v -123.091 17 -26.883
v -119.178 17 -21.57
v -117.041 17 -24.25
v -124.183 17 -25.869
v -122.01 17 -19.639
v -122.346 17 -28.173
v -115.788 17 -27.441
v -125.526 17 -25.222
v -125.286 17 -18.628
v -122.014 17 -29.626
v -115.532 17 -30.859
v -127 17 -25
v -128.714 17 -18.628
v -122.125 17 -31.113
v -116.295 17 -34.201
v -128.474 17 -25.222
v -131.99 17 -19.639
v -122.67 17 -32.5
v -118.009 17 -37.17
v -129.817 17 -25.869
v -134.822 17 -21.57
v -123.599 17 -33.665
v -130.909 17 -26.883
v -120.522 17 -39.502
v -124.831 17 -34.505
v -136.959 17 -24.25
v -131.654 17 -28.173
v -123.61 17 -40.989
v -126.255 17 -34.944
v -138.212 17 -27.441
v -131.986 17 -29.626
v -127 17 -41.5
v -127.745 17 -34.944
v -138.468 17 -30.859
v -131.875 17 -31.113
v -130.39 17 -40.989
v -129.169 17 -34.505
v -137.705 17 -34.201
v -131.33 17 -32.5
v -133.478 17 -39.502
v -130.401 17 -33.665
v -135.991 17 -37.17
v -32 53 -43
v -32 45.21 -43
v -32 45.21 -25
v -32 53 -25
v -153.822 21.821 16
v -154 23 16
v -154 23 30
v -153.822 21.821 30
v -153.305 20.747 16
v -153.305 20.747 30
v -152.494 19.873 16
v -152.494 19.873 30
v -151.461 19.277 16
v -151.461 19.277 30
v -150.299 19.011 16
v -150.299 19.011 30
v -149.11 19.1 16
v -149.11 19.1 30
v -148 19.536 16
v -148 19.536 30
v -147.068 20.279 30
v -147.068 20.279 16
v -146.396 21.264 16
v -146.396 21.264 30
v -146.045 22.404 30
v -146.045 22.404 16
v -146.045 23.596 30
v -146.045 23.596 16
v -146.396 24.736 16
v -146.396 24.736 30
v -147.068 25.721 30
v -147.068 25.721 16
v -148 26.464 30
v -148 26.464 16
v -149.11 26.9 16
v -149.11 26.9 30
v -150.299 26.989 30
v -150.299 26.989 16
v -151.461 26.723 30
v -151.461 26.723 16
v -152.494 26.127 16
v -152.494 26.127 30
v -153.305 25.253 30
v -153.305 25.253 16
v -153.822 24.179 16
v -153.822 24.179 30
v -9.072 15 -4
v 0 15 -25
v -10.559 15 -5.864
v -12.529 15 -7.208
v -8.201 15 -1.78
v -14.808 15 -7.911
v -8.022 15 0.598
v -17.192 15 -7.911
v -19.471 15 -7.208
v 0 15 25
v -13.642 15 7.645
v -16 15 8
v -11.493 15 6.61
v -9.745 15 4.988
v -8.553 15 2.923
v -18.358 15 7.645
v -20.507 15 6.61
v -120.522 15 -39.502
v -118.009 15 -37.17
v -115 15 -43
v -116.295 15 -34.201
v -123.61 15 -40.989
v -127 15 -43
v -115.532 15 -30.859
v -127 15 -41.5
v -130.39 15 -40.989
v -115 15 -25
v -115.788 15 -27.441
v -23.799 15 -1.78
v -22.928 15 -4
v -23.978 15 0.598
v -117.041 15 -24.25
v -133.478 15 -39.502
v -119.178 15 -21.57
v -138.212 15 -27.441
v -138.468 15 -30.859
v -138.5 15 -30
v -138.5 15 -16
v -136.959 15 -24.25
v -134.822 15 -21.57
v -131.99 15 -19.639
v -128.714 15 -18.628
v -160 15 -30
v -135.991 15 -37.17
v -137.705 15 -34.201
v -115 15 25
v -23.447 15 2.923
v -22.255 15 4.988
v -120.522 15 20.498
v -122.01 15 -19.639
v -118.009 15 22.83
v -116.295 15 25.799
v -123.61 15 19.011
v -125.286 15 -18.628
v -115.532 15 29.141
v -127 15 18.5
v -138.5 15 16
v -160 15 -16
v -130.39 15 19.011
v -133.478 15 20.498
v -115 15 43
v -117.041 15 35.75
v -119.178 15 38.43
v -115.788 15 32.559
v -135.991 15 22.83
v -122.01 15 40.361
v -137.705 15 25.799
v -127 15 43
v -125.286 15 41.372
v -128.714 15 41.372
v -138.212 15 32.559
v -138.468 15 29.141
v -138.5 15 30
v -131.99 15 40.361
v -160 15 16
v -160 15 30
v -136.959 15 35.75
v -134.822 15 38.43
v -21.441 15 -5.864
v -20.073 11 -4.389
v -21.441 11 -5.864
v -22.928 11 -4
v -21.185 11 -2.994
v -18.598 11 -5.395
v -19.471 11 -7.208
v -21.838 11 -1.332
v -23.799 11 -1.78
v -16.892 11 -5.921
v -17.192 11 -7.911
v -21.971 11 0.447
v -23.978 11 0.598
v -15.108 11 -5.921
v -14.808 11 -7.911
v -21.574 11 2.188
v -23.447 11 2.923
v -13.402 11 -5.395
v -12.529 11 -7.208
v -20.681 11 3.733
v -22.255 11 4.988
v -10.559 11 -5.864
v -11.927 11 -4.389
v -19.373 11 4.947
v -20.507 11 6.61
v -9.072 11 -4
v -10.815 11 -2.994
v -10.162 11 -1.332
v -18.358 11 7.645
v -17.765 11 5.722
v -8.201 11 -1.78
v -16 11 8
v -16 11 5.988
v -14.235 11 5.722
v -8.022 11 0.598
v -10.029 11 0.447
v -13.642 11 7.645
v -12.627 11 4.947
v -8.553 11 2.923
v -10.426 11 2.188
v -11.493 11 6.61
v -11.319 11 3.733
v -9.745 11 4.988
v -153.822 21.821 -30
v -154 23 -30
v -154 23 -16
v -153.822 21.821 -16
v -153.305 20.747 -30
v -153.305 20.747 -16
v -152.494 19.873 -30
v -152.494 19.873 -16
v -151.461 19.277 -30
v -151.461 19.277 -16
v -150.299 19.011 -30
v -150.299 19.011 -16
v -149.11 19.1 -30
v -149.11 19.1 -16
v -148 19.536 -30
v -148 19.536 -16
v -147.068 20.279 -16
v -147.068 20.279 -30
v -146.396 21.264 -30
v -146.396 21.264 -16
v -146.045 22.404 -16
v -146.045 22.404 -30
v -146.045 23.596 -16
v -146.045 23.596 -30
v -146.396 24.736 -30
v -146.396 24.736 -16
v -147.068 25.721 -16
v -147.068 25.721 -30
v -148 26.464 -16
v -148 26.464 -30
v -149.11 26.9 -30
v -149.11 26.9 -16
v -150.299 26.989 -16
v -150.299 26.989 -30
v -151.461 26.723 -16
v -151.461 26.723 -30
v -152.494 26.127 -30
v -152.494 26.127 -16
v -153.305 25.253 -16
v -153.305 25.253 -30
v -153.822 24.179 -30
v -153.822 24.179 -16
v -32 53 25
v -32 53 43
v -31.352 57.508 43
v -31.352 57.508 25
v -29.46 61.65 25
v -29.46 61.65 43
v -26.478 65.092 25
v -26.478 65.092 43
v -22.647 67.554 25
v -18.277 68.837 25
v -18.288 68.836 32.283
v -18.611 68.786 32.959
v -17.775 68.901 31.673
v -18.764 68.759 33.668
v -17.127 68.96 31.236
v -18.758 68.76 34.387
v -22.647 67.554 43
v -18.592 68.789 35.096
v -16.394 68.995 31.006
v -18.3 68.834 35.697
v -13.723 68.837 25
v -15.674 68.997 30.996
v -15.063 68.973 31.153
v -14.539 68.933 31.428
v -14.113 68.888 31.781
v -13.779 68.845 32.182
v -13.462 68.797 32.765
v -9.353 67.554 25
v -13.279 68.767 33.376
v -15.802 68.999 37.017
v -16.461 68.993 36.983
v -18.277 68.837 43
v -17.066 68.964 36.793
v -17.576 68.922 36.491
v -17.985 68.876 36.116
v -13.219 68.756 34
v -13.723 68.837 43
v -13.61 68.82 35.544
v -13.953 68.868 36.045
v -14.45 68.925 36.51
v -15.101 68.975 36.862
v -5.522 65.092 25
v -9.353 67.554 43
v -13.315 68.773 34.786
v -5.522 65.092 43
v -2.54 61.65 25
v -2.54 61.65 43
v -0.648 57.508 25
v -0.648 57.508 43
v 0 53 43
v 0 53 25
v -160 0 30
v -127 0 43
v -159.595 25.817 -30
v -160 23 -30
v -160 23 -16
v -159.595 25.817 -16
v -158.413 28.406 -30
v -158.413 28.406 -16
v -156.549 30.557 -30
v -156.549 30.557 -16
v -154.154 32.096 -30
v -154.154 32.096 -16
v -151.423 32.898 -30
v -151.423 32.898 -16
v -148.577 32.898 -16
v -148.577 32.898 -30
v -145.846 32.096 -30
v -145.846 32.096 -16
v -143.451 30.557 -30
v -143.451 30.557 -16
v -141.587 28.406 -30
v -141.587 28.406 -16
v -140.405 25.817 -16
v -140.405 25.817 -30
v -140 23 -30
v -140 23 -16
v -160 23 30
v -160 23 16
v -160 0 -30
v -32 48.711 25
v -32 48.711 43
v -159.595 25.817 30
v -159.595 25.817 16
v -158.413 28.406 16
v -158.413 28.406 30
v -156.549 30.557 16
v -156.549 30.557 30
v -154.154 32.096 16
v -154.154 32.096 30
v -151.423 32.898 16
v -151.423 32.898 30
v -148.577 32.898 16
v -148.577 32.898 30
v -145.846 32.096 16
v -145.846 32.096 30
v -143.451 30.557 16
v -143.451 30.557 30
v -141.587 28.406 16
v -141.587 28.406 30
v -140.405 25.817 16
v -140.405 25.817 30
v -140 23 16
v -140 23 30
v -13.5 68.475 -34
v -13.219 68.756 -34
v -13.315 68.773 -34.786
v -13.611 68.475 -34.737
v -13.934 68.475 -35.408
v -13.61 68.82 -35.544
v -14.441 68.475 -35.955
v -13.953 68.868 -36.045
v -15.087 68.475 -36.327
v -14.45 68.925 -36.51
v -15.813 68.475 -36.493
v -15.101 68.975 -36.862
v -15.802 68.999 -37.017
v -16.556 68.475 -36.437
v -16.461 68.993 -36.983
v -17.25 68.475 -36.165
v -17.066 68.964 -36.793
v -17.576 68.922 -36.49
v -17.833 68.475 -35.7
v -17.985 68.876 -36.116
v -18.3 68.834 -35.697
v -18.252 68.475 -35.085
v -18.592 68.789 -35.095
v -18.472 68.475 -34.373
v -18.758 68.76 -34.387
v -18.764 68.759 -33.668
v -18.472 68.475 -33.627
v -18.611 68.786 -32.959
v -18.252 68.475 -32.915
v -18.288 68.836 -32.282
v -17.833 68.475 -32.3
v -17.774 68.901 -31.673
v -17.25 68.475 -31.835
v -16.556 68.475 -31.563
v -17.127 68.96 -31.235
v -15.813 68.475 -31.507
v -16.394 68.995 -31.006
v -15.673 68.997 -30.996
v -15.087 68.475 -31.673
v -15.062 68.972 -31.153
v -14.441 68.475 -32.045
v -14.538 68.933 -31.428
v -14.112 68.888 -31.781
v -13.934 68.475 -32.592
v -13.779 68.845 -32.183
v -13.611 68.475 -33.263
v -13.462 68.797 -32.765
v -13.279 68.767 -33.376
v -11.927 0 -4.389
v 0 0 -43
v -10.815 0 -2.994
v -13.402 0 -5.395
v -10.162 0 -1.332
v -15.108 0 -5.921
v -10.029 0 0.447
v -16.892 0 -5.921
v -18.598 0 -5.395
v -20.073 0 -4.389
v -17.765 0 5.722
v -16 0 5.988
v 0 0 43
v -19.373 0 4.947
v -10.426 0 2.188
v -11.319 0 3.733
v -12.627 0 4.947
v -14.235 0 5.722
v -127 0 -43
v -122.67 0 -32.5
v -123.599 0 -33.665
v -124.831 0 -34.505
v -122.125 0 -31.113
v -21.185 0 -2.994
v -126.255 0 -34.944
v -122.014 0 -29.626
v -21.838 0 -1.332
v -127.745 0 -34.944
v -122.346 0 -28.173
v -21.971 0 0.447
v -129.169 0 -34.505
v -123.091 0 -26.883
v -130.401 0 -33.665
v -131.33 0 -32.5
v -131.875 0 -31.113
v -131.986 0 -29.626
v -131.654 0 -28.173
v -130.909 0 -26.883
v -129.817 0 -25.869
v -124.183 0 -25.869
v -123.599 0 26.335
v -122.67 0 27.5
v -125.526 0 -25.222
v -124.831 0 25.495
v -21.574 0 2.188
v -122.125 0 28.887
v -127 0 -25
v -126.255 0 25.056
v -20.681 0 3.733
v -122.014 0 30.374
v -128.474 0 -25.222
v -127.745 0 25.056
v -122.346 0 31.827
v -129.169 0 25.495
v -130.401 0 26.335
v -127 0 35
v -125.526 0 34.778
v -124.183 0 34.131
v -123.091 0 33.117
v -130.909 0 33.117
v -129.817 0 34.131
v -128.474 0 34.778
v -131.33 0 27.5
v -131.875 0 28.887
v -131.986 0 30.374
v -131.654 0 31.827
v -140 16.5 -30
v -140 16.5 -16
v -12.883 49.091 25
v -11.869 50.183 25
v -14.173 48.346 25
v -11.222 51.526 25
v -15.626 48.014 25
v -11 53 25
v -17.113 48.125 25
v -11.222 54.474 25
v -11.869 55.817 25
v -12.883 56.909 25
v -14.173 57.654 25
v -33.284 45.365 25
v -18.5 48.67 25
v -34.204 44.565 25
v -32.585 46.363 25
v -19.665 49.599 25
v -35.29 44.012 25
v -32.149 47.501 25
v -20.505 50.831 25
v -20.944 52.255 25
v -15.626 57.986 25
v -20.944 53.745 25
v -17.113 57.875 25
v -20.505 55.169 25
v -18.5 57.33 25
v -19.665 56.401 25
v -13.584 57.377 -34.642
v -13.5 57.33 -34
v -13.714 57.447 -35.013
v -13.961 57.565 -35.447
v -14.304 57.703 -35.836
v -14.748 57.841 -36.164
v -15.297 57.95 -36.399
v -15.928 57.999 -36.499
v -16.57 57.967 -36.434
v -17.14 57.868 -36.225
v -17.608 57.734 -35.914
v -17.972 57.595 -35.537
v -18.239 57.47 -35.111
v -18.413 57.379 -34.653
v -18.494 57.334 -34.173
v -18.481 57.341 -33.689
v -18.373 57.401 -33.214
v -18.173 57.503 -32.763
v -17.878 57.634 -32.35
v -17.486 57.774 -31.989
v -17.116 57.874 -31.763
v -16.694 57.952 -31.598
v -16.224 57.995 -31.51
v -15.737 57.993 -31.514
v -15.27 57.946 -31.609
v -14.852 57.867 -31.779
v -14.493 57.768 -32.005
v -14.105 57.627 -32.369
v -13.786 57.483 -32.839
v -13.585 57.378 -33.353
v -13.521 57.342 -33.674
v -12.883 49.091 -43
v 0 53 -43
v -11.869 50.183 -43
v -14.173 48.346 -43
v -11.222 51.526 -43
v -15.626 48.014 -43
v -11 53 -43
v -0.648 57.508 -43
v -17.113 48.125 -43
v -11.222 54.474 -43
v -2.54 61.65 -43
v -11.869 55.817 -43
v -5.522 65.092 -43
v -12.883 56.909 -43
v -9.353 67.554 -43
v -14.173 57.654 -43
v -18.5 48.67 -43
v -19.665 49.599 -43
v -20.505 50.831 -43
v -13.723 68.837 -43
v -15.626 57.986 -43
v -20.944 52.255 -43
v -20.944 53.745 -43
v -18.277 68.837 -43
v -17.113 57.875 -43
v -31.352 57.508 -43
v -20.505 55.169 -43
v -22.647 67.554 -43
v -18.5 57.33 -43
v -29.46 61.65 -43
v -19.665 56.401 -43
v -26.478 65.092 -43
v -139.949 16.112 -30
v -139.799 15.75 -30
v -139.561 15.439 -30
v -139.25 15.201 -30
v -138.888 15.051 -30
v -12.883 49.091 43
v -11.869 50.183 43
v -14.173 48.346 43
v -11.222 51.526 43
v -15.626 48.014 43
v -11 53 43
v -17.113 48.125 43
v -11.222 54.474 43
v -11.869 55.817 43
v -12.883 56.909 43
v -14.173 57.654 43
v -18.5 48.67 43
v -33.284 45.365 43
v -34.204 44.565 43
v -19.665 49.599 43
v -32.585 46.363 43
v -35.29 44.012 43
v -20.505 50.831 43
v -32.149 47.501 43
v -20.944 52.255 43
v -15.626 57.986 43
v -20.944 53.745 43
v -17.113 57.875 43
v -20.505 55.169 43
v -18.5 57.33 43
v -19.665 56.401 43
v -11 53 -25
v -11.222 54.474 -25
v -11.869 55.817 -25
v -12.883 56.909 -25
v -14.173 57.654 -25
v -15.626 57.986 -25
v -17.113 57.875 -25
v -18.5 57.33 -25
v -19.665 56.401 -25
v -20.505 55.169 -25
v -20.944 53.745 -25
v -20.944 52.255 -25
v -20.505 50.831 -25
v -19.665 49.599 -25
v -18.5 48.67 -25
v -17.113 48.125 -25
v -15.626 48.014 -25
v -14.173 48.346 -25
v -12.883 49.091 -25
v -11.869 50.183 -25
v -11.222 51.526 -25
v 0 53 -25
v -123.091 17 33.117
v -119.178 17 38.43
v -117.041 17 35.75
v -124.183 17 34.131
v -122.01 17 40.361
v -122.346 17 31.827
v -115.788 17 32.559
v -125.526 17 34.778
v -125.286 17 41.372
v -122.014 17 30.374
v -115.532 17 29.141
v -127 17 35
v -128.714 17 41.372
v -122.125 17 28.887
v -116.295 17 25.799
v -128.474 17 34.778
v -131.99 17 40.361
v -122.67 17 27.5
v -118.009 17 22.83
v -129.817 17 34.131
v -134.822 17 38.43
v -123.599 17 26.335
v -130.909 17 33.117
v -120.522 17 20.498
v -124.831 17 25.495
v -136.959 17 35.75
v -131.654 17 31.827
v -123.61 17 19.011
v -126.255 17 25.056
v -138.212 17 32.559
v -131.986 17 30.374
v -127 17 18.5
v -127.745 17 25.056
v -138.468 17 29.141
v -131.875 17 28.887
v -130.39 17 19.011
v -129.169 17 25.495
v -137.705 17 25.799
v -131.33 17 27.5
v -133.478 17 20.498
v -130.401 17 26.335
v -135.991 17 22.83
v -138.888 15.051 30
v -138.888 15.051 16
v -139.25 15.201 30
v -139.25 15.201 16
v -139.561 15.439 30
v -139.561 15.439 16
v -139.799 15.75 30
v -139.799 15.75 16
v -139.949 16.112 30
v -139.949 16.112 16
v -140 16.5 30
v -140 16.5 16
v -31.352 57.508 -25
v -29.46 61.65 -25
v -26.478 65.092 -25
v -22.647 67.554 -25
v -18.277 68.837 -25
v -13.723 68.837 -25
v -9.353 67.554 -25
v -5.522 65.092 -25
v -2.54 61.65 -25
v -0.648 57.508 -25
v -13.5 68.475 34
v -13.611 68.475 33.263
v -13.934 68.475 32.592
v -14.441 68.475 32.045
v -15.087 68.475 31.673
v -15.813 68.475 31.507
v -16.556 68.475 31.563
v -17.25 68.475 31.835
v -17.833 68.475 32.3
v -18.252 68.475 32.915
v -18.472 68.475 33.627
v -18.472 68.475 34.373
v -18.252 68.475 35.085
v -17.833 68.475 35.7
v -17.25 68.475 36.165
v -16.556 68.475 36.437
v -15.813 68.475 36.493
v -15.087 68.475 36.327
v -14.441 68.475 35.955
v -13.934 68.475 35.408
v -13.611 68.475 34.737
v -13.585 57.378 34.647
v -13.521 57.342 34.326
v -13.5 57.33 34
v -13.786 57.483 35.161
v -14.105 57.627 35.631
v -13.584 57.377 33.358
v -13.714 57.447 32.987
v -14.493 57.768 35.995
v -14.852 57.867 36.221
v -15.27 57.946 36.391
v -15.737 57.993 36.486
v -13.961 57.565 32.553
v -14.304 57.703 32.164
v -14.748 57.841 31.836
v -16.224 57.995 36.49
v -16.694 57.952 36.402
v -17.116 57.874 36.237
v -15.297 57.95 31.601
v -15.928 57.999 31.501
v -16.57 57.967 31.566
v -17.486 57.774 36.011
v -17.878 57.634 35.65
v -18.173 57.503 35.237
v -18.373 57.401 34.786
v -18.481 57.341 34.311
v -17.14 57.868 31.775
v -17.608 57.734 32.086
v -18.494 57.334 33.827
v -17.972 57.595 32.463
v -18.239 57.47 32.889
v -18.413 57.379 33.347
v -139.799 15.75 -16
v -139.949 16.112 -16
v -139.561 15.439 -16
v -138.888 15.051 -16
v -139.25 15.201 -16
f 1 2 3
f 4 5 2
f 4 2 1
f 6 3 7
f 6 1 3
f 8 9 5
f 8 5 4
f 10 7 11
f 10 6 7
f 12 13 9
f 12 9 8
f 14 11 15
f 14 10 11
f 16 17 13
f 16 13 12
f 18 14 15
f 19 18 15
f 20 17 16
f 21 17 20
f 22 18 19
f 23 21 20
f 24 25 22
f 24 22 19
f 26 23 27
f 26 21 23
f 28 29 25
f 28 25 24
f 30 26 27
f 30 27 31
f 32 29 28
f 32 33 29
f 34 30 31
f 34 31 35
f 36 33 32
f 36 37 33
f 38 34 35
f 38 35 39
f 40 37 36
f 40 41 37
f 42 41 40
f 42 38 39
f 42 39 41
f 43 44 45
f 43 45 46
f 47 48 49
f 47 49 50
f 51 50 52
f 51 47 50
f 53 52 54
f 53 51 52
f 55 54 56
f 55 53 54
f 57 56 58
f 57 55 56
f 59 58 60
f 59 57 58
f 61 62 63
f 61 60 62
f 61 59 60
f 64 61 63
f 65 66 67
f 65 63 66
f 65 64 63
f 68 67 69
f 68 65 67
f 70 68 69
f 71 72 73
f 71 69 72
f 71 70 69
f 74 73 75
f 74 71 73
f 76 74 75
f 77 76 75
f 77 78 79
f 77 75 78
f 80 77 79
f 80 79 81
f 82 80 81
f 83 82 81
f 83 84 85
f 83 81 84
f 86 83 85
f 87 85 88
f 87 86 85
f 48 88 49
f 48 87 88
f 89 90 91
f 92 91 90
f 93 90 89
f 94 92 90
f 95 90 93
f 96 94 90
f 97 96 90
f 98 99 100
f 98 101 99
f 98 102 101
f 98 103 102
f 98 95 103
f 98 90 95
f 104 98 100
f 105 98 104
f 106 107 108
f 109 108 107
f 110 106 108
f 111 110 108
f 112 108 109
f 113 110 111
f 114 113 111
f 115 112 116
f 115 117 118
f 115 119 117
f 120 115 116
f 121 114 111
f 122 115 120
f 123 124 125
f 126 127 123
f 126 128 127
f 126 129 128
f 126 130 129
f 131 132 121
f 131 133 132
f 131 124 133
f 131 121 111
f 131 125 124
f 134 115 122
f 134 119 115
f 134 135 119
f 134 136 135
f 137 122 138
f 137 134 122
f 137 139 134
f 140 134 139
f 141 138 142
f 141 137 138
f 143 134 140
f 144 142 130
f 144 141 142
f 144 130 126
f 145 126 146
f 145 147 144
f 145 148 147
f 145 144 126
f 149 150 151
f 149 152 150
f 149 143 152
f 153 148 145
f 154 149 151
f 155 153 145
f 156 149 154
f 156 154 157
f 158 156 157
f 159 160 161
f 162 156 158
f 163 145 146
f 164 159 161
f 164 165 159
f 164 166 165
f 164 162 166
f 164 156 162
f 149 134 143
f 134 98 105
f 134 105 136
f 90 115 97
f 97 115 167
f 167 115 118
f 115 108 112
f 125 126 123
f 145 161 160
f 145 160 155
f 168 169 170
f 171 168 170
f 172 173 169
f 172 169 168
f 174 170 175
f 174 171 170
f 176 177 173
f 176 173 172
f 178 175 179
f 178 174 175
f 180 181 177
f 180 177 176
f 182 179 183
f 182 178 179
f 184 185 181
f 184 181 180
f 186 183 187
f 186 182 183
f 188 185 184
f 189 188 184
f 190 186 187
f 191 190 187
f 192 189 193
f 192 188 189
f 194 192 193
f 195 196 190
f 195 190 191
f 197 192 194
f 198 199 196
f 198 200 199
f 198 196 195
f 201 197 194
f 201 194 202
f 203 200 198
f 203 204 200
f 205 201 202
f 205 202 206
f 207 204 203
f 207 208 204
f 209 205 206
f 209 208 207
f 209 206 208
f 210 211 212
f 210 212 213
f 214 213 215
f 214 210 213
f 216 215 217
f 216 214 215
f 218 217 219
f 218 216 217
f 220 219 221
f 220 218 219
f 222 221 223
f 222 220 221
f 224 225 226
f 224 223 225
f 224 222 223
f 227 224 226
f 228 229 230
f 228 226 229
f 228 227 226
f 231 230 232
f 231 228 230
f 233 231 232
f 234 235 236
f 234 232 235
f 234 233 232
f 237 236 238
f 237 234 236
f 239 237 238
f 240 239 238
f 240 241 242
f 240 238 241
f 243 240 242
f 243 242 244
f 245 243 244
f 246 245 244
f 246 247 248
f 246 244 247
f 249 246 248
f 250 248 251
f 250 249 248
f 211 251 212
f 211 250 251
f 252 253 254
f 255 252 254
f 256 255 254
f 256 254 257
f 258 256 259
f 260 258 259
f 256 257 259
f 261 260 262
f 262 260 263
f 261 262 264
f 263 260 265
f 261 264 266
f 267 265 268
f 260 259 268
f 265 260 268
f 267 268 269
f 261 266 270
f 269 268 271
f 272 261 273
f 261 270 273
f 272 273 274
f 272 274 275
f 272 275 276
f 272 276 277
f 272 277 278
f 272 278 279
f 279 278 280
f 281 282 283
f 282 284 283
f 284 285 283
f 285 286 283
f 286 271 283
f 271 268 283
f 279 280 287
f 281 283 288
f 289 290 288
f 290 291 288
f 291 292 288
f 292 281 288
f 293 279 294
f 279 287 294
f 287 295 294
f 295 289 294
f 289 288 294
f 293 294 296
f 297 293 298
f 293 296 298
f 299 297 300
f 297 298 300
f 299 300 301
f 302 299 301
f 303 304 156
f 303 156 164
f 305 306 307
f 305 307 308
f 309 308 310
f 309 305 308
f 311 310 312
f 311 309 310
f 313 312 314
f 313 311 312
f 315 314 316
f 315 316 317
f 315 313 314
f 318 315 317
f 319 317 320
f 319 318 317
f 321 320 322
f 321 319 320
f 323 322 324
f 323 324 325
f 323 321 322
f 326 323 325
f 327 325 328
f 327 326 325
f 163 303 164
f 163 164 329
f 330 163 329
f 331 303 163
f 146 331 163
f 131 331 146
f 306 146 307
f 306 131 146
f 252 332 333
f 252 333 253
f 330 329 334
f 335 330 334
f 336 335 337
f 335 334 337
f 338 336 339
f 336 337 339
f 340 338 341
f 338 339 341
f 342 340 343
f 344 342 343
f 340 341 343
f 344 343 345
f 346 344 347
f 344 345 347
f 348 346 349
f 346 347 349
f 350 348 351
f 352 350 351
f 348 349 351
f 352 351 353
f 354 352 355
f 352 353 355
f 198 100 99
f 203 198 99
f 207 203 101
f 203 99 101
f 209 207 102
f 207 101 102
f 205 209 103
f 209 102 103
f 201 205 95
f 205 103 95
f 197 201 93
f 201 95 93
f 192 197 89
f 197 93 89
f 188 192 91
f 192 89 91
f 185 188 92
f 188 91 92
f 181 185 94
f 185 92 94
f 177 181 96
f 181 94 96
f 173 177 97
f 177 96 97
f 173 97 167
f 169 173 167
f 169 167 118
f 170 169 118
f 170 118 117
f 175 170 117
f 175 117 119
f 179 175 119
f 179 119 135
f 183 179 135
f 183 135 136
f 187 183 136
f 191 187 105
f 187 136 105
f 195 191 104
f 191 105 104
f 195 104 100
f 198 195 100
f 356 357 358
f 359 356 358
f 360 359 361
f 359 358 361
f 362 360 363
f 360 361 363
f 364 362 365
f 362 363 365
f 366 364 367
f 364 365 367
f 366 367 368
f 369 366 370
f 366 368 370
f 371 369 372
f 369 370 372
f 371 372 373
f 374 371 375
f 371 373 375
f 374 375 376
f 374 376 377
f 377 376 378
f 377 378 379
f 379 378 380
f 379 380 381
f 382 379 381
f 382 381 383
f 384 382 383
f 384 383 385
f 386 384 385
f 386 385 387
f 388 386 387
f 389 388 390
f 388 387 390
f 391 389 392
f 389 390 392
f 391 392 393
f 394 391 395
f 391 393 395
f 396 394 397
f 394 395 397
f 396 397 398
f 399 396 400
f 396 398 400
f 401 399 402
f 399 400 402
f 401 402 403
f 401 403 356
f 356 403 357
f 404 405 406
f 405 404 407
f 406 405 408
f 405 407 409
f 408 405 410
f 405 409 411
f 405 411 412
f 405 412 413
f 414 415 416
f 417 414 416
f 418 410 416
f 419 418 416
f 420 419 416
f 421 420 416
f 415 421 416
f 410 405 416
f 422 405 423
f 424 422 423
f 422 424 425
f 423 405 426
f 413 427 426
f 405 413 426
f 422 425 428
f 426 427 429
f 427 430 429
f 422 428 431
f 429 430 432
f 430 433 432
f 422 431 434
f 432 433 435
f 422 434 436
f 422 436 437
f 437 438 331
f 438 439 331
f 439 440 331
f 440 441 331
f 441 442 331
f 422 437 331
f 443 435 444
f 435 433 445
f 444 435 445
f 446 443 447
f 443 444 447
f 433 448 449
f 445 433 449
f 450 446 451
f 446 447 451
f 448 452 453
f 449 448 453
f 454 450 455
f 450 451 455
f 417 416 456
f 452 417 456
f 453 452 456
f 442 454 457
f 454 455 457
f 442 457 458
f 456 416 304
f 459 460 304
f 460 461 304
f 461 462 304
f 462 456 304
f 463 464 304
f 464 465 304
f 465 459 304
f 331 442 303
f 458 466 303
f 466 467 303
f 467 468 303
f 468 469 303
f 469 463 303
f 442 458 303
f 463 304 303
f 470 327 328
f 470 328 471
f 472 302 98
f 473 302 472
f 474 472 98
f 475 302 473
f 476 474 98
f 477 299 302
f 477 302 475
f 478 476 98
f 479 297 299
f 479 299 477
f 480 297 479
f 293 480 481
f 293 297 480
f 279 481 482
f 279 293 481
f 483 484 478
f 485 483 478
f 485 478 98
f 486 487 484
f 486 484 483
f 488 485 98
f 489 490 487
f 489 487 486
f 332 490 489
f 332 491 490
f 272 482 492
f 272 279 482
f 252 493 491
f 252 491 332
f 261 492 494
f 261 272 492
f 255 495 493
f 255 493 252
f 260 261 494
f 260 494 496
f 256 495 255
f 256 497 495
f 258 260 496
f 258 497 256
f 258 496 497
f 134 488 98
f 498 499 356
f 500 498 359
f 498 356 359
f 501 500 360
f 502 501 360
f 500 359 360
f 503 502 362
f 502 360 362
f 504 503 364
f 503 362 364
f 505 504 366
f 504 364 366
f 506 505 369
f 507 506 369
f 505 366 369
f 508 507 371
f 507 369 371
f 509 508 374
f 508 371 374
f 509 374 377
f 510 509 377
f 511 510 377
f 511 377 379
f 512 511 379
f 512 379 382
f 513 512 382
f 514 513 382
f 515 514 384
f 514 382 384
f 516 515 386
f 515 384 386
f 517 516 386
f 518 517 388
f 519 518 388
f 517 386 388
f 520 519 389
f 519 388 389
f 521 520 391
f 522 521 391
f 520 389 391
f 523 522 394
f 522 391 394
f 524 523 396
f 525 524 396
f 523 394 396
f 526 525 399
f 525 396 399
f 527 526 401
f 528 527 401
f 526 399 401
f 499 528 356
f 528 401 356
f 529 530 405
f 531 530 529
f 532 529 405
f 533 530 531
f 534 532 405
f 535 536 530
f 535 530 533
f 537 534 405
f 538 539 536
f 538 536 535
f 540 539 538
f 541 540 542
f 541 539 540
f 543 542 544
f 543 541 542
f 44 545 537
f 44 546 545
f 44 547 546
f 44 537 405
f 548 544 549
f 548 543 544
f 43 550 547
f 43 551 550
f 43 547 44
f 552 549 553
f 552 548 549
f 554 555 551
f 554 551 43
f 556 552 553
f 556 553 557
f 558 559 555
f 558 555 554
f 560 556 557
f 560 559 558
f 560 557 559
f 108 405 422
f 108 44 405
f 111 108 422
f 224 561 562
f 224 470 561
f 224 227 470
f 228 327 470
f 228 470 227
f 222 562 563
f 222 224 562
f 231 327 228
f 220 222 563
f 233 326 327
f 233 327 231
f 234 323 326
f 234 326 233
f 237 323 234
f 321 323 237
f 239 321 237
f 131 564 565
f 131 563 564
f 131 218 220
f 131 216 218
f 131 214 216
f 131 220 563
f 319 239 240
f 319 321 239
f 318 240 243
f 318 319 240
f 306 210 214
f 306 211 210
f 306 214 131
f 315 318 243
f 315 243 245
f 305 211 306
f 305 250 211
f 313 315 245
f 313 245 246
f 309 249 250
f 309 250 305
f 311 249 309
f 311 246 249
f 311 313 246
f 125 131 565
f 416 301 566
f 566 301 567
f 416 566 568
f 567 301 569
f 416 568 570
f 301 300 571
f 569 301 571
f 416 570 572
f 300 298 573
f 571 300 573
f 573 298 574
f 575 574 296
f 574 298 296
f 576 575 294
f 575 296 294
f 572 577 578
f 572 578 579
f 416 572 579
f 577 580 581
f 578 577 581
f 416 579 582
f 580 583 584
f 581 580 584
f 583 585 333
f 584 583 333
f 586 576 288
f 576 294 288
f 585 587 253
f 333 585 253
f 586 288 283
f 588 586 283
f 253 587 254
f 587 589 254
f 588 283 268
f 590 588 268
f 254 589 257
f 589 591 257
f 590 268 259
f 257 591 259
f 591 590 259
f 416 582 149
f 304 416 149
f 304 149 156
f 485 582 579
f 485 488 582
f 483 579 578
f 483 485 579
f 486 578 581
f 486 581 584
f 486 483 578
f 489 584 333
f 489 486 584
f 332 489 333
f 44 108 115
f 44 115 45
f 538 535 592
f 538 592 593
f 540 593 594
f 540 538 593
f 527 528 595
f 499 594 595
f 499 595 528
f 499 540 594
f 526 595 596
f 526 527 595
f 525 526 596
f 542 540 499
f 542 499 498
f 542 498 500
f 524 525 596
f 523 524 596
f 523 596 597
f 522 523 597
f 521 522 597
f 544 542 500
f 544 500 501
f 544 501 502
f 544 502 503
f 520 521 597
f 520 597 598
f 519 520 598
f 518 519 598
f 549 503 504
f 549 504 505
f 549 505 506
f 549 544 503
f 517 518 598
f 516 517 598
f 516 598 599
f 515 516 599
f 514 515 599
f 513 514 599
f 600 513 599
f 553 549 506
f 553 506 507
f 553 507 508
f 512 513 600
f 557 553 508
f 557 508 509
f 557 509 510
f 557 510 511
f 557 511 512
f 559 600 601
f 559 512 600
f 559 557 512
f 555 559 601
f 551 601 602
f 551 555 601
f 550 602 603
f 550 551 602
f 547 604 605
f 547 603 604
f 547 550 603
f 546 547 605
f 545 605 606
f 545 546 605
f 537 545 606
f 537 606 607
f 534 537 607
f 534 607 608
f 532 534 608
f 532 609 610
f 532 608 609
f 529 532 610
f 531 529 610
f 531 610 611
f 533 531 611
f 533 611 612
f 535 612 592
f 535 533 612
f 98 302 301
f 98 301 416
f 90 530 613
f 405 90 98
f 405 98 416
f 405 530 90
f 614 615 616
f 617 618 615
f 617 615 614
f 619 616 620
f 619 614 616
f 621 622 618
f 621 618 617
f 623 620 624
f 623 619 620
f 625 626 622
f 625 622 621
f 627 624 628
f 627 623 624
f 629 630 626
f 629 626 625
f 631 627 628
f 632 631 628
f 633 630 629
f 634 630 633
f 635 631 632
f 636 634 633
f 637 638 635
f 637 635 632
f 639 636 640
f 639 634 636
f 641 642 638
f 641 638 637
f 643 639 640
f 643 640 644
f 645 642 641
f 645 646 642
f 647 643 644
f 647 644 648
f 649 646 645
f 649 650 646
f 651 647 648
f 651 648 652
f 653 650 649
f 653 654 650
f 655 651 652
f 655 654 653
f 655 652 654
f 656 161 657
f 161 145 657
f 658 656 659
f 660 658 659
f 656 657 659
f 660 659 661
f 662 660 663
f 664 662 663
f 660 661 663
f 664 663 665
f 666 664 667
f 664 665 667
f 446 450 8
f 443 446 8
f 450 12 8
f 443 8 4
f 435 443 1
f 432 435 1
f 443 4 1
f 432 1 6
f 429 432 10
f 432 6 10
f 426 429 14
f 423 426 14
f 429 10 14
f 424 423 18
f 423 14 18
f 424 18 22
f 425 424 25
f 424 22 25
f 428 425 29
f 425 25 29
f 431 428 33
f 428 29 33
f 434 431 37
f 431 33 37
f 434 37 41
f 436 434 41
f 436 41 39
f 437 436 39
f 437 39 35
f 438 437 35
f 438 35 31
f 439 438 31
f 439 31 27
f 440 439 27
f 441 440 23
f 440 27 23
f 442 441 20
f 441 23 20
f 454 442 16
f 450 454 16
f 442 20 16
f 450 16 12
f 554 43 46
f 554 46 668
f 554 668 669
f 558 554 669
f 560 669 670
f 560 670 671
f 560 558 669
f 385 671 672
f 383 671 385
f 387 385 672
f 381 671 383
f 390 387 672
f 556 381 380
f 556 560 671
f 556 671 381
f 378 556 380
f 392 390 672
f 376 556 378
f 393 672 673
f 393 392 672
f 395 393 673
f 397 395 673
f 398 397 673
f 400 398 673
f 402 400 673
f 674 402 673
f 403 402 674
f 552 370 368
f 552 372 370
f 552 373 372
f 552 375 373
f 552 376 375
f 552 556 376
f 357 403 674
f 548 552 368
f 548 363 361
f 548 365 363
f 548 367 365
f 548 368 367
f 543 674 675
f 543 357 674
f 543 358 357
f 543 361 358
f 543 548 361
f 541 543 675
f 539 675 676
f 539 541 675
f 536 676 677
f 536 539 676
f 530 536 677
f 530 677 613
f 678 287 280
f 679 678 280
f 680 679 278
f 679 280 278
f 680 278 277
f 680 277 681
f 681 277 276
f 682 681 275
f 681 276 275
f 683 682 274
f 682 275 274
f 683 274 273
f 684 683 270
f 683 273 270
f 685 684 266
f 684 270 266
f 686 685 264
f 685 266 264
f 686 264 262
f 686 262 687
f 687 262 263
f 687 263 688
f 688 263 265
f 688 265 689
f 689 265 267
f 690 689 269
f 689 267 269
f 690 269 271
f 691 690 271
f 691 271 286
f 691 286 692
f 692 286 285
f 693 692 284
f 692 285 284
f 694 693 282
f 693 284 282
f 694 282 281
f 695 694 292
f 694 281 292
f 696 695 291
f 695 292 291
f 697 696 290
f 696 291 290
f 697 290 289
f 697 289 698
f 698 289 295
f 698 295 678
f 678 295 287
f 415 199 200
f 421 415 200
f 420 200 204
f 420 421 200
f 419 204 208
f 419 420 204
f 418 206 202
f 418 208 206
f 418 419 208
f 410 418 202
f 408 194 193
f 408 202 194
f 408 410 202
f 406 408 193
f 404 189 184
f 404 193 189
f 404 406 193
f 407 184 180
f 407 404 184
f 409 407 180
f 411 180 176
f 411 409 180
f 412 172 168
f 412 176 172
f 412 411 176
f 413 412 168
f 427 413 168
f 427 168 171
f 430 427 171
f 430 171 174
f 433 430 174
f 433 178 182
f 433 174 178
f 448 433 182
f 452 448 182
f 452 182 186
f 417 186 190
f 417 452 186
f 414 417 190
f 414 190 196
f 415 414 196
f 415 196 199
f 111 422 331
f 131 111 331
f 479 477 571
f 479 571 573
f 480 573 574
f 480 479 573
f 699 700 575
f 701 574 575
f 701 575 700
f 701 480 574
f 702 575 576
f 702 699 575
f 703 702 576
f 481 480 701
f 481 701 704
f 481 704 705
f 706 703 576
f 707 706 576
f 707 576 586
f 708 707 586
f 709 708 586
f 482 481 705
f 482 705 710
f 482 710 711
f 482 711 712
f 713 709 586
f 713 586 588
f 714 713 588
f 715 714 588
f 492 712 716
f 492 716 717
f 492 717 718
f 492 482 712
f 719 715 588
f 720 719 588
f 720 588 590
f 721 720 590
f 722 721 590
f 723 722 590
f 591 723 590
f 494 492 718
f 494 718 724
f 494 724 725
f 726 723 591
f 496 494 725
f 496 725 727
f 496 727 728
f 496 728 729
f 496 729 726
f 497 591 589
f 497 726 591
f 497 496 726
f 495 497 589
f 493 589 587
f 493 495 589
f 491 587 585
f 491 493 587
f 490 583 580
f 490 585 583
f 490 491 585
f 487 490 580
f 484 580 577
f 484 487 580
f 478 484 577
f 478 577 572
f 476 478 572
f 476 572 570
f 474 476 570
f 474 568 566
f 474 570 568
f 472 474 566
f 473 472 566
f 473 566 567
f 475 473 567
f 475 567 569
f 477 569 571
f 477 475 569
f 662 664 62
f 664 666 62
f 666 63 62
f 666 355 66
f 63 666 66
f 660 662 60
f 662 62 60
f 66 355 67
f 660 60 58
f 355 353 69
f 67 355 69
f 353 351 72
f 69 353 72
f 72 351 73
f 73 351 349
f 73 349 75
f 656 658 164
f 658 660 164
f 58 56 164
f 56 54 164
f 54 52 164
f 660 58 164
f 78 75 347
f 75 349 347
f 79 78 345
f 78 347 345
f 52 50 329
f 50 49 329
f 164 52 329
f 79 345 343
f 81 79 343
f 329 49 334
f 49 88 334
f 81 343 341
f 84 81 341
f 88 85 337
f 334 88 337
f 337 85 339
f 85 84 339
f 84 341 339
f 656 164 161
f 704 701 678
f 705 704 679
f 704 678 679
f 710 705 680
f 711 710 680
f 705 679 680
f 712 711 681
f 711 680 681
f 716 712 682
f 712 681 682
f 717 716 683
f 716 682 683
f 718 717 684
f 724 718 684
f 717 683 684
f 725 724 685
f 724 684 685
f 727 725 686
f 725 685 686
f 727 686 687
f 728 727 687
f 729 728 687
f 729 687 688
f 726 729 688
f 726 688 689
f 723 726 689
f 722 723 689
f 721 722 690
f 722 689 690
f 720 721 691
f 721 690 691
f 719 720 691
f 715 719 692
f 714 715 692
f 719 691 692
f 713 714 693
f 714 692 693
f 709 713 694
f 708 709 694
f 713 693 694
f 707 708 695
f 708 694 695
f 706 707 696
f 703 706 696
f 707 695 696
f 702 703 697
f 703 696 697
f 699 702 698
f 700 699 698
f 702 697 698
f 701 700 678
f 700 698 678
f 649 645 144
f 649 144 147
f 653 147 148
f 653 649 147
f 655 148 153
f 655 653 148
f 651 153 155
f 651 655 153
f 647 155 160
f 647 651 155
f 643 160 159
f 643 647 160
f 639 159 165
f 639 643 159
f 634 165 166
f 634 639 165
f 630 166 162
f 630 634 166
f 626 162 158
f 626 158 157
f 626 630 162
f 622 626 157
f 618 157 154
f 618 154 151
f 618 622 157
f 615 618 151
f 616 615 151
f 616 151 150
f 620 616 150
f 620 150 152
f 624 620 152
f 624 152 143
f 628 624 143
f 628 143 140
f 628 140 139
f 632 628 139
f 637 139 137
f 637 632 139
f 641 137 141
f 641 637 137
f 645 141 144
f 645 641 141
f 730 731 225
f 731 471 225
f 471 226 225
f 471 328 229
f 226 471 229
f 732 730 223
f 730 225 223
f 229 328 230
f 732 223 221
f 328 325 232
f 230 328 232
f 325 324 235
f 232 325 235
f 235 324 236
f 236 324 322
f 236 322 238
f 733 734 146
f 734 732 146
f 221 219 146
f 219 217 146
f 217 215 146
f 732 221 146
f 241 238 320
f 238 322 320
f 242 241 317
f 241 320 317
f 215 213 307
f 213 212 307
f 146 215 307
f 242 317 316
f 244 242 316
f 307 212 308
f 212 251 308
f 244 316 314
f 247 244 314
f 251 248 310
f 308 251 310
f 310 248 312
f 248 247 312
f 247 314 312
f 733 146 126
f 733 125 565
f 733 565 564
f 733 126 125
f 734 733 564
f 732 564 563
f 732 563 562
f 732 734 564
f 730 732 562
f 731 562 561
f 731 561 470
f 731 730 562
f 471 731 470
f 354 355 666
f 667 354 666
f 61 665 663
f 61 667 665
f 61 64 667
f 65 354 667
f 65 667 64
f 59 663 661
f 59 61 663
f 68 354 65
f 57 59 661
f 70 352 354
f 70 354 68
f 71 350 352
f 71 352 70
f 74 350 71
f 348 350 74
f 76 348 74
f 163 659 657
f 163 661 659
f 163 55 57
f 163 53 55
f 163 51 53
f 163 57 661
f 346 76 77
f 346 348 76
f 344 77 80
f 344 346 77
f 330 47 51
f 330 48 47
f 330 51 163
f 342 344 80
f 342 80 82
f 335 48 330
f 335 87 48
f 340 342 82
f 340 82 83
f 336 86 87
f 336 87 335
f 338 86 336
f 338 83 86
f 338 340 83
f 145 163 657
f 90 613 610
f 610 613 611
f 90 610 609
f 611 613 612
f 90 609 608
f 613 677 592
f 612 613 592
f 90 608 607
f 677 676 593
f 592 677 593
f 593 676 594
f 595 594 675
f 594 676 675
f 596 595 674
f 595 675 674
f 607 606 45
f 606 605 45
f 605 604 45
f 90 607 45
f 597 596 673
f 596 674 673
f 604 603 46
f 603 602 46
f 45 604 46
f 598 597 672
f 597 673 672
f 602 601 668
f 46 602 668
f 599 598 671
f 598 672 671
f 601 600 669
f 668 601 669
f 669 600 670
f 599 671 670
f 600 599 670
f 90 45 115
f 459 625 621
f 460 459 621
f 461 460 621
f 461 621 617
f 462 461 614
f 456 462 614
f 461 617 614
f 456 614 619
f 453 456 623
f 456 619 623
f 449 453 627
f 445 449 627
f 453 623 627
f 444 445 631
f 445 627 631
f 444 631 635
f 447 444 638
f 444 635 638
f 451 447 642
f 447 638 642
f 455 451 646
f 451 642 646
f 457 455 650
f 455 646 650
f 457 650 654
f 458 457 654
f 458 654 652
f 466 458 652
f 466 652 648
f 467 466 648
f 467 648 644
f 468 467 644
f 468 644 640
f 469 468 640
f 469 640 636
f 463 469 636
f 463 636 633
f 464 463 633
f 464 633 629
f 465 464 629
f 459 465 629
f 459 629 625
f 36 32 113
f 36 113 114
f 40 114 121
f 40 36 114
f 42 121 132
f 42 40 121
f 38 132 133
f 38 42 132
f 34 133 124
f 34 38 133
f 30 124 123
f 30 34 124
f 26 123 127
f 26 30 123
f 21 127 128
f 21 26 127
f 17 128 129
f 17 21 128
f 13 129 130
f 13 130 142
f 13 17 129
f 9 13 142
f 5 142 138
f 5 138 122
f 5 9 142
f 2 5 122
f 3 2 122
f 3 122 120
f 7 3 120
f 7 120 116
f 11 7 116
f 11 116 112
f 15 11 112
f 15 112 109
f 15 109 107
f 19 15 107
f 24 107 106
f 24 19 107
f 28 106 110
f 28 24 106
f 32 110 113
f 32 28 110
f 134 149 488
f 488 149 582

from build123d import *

# Parameters (mm, degrees)
BOSS_EXTRU_1_DEPTH           = 15
BOSS_EXTRU_2_DEPTH           = 18
BOSS_EXTRU_3_DEPTH           = 14
CONG_1_R                     = 5
ENL_V_MAT_EXTRU_1_DEPTH      = 189.917971617
ENL_V_MAT_EXTRU_1_DEPTH_BACK = 189.917971617
ESQUISSE4_R                  = 4
ENL_V_MAT_EXTRU_2_DEPTH      = 195.311605418
ENL_V_MAT_EXTRU_2_DEPTH_BACK = 195.311605418
ESQUISSE5_R                  = 5
ENL_V_MAT_EXTRU_3_DEPTH      = 175.255559452
ENL_V_MAT_EXTRU_3_DEPTH_BACK = 175.255559452
ESQUISSE6_R                  = 5.987648709
ESQUISSE7_R                  = 8
ENL_V_MAT_EXTRU_4_DEPTH      = 4
ENL_V_MAT_EXTRU_5_REACH      = 176.256
ESQUISSE12_R                 = 5
BOSS_EXTRU_4_START           = 2
ESQUISSE13_R                 = 11.5
ESQUISSE13_R_2               = 5
BOSS_EXTRU_4_DEPTH           = 2
CONG_2_R                     = 1.5


# Read off the part's stored shape, not the designer's step: Trou taraudé M61
with BuildPart() as part:
    # Esquisse1 → Boss.-Extru.1 (new body)
    with BuildSketch(Plane(origin=(0, 0, 0), x_dir=(1, 0, 0), z_dir=(0, 1, 0))):
        Polygon((0, -43), (-127, -43), (-160, -30), (-160, 0), (0, 0), align=None)
    boss_extru_1 = extrude(amount=BOSS_EXTRU_1_DEPTH)

    # Esquisse2 → Boss.-Extru.2 (add)
    with BuildSketch(Plane.XY.offset(43)):
        with BuildLine():
            Line((-32, 45.209529444), (-32, 53))
            ThreePointArc((-32, 53), (-16, 69), (0, 53))
            Line((0, 53), (0, 15))
            Line((0, 15), (-115, 15))
            Line((-115, 15), (-32, 45.209529444))
        make_face()
    boss_extru_2 = extrude(amount=-BOSS_EXTRU_2_DEPTH)

    # Esquisse3 → Boss.-Extru.3 (add)
    with BuildSketch(Plane.XY.offset(30)):
        with BuildLine():
            Line((-140, 23), (-140, 15))
            Line((-140, 15), (-160, 15))
            Line((-160, 15), (-160, 23))
            ThreePointArc((-160, 23), (-150, 33), (-140, 23))
        make_face()
    boss_extru_3 = extrude(amount=-BOSS_EXTRU_3_DEPTH)

    # Congé1
    cong_1_edges = [part.edges().sort_by_distance(p)[0] for p in [
        (-32, 45.209529444, 34),
    ]]
    fillet(cong_1_edges, radius=CONG_1_R)

    # Symétrie1: Boss.-Extru.1, Boss.-Extru.2, Boss.-Extru.3 across plane
    add(boss_extru_1.mirror(Plane.XY))
    add(boss_extru_2.mirror(Plane.XY))
    add(boss_extru_3.mirror(Plane.XY))

    # Esquisse4 → Enlèv. mat.-Extru.1 (cut, two sides: drawn at the far end of the back side and taken through both)
    with BuildSketch(Plane.XY.offset(30).offset(-ENL_V_MAT_EXTRU_1_DEPTH_BACK)):
        with Locations(Location((-150, 23, 0), (0, 0, 180))):
            Circle(ESQUISSE4_R)
    extrude(amount=ENL_V_MAT_EXTRU_1_DEPTH + ENL_V_MAT_EXTRU_1_DEPTH_BACK, mode=Mode.SUBTRACT)

    # Esquisse5 → Enlèv. mat.-Extru.2 (cut, two sides: drawn at the far end of the back side and taken through both)
    with BuildSketch(Plane.XY.offset(43).offset(-ENL_V_MAT_EXTRU_2_DEPTH_BACK)):
        with Locations((-16, 53)):
            Circle(ESQUISSE5_R)
    extrude(amount=ENL_V_MAT_EXTRU_2_DEPTH + ENL_V_MAT_EXTRU_2_DEPTH_BACK, mode=Mode.SUBTRACT)

    # Esquisse6 → Enlèv. mat.-Extru.3 (cut, two sides: drawn at the far end of the back side and taken through both)
    with BuildSketch(Plane(origin=(0, 15, 0), x_dir=(1, 0, 0), z_dir=(0, 1, 0)).offset(-ENL_V_MAT_EXTRU_3_DEPTH_BACK)):
        with Locations(Location((-16, 0, 0), (0, 0, 270))):
            Circle(ESQUISSE6_R)
    extrude(amount=ENL_V_MAT_EXTRU_3_DEPTH + ENL_V_MAT_EXTRU_3_DEPTH_BACK, mode=Mode.SUBTRACT)

    # Esquisse7 → Enlèv. mat.-Extru.4 (cut)
    with BuildSketch(Plane(origin=(0, 15, 0), x_dir=(1, 0, 0), z_dir=(0, 1, 0))):
        with Locations(Location((-16, 0, 0), (0, 0, 270))):
            Circle(ESQUISSE7_R)
    extrude(amount=-ENL_V_MAT_EXTRU_4_DEPTH, mode=Mode.SUBTRACT)

    # Trou taraudé M61 outline → Trou taraudé M61 (revolve, cut)
    with BuildSketch(Plane(origin=(-16, 0, 34), x_dir=(1, 0, 0), z_dir=(0, 0, 1))):
        Polygon((0, 57.329808988), (2.5, 57.329808988), (2.5, 68.475), (3.02508907, 69.00008907), (0, 69.00008907), align=None)
    revolve(axis=Axis((-16, 0, 34), (0, 1, 0)), mode=Mode.SUBTRACT)

    # Trou taraud_ M61 2 outline → Trou taraud_ M61 2 (revolve, cut)
    with BuildSketch(Plane(origin=(-16, 0, -34), x_dir=(1, 0, 0), z_dir=(0, 0, 1))):
        Polygon((3.025080927, 69.000080927), (0, 69.000080927), (0, 57.329808988), (2.5, 57.329808988), (2.5, 68.475), align=None)
    revolve(axis=Axis((-16, 0, -34), (0, 1, 0)), mode=Mode.SUBTRACT)

    # Esquisse12 → Enlèv. mat.-Extru.5 (cut, up to next)
    with BuildSketch(Plane(origin=(0, 15, 0), x_dir=(1, 0, 0), z_dir=(0, 1, 0)), mode=Mode.PRIVATE) as enl_v_mat_extru_5_sk1:
        with Locations(Location((-127, -30, 0), (0, 0, 270))):
            Circle(ESQUISSE12_R)
    enl_v_mat_extru_5_tool1 = extrude(enl_v_mat_extru_5_sk1.sketch, amount=-ENL_V_MAT_EXTRU_5_REACH, mode=Mode.PRIVATE) & part.part
    # Esquisse12 → Enlèv. mat.-Extru.5 (cut, up to next)
    with BuildSketch(Plane(origin=(0, 15, 0), x_dir=(1, 0, 0), z_dir=(0, 1, 0)), mode=Mode.PRIVATE) as enl_v_mat_extru_5_sk2:
        with Locations(Location((-127, 30, 0), (0, 0, 270))):
            Circle(ESQUISSE12_R)
    enl_v_mat_extru_5_tool2 = extrude(enl_v_mat_extru_5_sk2.sketch, amount=-ENL_V_MAT_EXTRU_5_REACH, mode=Mode.PRIVATE) & part.part
    add(enl_v_mat_extru_5_tool1.solids().sort_by_distance((-127, 15, 30))[0], mode=Mode.SUBTRACT)
    add(enl_v_mat_extru_5_tool2.solids().sort_by_distance((-127, 15, -30))[0], mode=Mode.SUBTRACT)

    # Esquisse13 → Boss.-Extru.4 (add)
    # profile 1 of 2: a face of its own
    with BuildSketch(Plane(origin=(0, 15, 0), x_dir=(1, 0, 0), z_dir=(0, 1, 0)).offset(BOSS_EXTRU_4_START)):
        with Locations(Location((-127, -30, 0), (0, 0, 90))):
            Circle(ESQUISSE13_R)
        with Locations(Location((-127, -30, 0), (0, 0, 270))):
            Circle(ESQUISSE13_R_2, mode=Mode.SUBTRACT)
    # profile 2 of 2: a face of its own
    with BuildSketch(Plane(origin=(0, 15, 0), x_dir=(1, 0, 0), z_dir=(0, 1, 0)).offset(BOSS_EXTRU_4_START)):
        with Locations(Location((-127, 30, 0), (0, 0, 90))):
            Circle(ESQUISSE13_R)
        with Locations(Location((-127, 30, 0), (0, 0, 270))):
            Circle(ESQUISSE13_R_2, mode=Mode.SUBTRACT)
    extrude(amount=-BOSS_EXTRU_4_DEPTH)

    # Congé2
    cong_2_edges = [part.edges().sort_by_distance(p)[0] for p in [
        (-140, 15, 23),
        (-140, 15, -23),
    ]]
    fillet(cong_2_edges, radius=CONG_2_R - 0.0001)  # a hair under: the kernel refuses the full size


solid = part.part
